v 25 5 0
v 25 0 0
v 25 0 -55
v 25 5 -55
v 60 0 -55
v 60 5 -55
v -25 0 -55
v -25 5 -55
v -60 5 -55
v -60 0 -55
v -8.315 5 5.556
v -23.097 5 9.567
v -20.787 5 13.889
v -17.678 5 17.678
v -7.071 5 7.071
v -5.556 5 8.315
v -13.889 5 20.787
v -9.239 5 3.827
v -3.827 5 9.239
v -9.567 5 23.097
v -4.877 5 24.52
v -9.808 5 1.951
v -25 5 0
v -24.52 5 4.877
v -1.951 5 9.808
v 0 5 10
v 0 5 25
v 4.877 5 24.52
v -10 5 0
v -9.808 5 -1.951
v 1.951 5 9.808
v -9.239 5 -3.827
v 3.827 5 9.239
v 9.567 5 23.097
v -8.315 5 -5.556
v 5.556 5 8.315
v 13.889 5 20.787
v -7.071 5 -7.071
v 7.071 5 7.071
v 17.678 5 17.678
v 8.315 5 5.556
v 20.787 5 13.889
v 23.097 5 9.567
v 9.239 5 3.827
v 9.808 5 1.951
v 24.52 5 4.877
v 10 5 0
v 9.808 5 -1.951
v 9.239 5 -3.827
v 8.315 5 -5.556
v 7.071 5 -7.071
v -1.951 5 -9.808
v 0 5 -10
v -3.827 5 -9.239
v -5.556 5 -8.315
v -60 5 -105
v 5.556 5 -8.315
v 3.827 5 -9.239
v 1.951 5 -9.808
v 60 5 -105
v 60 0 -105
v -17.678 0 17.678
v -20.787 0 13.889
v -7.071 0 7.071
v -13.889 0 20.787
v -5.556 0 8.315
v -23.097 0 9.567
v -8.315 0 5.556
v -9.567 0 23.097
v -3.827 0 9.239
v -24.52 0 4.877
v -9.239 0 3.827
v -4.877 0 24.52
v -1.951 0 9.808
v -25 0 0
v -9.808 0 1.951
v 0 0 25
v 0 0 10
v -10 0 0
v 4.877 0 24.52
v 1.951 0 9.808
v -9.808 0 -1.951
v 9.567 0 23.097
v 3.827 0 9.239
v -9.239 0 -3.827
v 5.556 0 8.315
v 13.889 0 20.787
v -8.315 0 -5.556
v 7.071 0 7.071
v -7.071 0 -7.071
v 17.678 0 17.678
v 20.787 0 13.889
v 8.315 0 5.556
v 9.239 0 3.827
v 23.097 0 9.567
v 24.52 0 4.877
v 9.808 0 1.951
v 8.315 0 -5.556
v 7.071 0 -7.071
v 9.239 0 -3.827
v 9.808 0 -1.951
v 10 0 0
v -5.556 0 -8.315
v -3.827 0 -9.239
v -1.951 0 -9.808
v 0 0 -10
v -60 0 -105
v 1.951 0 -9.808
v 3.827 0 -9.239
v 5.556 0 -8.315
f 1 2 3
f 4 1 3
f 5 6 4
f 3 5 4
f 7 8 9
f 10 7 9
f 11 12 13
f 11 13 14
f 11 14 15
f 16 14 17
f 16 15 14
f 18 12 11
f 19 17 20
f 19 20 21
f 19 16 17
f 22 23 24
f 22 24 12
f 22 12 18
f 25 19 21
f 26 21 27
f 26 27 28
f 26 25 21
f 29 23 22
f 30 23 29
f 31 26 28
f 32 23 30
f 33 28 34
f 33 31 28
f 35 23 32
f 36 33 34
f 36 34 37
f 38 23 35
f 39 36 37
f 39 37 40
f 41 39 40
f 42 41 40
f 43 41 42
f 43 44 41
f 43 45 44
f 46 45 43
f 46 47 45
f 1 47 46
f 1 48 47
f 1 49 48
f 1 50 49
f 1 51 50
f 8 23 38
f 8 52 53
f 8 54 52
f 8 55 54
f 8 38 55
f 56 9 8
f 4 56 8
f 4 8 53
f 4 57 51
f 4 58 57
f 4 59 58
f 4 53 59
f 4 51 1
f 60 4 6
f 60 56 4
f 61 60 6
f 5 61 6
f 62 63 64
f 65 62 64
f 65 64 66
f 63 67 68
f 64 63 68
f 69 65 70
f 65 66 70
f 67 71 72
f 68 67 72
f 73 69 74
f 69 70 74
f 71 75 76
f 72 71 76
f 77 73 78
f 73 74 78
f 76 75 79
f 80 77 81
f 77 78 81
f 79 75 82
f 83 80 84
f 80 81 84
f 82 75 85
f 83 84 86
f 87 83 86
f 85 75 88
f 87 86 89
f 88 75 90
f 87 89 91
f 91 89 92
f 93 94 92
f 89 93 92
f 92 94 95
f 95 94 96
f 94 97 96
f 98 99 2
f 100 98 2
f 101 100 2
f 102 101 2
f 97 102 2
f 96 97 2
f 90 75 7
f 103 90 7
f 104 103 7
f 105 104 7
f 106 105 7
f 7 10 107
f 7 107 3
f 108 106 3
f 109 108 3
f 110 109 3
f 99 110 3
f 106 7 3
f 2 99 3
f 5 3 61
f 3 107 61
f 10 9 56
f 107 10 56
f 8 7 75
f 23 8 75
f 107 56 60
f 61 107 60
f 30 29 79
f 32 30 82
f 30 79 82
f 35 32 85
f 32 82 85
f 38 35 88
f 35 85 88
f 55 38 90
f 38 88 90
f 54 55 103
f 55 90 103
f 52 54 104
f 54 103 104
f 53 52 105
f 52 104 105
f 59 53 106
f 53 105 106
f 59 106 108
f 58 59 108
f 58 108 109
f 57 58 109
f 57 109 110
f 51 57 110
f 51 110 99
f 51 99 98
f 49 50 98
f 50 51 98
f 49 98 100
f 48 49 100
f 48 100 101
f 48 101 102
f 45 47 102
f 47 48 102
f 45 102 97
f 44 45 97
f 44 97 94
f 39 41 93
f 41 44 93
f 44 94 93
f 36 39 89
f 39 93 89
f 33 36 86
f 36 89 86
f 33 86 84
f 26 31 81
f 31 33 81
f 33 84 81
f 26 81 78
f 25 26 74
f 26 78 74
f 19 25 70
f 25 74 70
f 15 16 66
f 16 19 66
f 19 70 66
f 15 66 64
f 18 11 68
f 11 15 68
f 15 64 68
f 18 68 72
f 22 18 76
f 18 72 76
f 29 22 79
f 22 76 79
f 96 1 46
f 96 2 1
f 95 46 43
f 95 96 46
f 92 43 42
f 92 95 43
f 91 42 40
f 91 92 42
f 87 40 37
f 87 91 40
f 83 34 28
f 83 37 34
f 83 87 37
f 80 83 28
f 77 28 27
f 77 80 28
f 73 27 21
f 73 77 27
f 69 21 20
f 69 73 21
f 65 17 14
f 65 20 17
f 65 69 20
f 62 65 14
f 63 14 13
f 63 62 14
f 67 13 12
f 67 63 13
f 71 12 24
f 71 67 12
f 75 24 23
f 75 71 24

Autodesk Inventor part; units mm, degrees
ref_plane "YZ Plane" through (0, 0, 0) normal (1, 0, 0) x (0, 1, 0)
ref_plane "XZ Plane" through (0, 0, 0) normal (0, 1, 0) x (-1, 0, 0)
ref_plane "XY Plane" through (0, 0, 0) normal (0, 0, 1) x (1, 0, 0)
sketch "スケッチ1" plane through (0, 0, 0) normal (0, 1, 0) x (-1, 0, 0)
  line L0 (25, 0) -> (-25, 0)
  line L1 (-25, 0) -> (-25, -105)
  line L2 (-25, -105) -> (25, -105)
  line L3 (25, -105) -> (25, 0)
  circle A0 centre (0, 0) radius 25
  circle A1 centre (0, 0) radius 57 construction
  circle A2 centre (0, 0) radius 75 construction
  circle A3 centre (0, 0) radius 10
  dimension "d0" = 114
  dimension "d2" = 150
  dimension "d4" = 20
  dimension "d5" = 50
  dimension "d28" = 105
extrude "押し出し1" add sketch "スケッチ1" along normal blind 5 contours A0 L0 A3 | L0 A3 A0 | L3 L2 L1 A0
sketch "スケッチ4" plane through (0, 5, 0) normal (0, 1, 0) x (1, 0, 0)
  line L0 (-60, 105) -> (60, 105)
  line L1 (60, 105) -> (60, 55)
  line L2 (60, 55) -> (-60, 55)
  line L3 (-60, 55) -> (-60, 105)
  line L4 (25, 105) -> (-25, 105) projected
  point P0 (0, 0)
  point P1 (0, 105)
  dimension "d24" = 50
  dimension "d25" = 120
extrude "押し出し4" add sketch "スケッチ4" against normal up to surface (5 mm away)
properties part number "ギアプレート_ギアなし"
